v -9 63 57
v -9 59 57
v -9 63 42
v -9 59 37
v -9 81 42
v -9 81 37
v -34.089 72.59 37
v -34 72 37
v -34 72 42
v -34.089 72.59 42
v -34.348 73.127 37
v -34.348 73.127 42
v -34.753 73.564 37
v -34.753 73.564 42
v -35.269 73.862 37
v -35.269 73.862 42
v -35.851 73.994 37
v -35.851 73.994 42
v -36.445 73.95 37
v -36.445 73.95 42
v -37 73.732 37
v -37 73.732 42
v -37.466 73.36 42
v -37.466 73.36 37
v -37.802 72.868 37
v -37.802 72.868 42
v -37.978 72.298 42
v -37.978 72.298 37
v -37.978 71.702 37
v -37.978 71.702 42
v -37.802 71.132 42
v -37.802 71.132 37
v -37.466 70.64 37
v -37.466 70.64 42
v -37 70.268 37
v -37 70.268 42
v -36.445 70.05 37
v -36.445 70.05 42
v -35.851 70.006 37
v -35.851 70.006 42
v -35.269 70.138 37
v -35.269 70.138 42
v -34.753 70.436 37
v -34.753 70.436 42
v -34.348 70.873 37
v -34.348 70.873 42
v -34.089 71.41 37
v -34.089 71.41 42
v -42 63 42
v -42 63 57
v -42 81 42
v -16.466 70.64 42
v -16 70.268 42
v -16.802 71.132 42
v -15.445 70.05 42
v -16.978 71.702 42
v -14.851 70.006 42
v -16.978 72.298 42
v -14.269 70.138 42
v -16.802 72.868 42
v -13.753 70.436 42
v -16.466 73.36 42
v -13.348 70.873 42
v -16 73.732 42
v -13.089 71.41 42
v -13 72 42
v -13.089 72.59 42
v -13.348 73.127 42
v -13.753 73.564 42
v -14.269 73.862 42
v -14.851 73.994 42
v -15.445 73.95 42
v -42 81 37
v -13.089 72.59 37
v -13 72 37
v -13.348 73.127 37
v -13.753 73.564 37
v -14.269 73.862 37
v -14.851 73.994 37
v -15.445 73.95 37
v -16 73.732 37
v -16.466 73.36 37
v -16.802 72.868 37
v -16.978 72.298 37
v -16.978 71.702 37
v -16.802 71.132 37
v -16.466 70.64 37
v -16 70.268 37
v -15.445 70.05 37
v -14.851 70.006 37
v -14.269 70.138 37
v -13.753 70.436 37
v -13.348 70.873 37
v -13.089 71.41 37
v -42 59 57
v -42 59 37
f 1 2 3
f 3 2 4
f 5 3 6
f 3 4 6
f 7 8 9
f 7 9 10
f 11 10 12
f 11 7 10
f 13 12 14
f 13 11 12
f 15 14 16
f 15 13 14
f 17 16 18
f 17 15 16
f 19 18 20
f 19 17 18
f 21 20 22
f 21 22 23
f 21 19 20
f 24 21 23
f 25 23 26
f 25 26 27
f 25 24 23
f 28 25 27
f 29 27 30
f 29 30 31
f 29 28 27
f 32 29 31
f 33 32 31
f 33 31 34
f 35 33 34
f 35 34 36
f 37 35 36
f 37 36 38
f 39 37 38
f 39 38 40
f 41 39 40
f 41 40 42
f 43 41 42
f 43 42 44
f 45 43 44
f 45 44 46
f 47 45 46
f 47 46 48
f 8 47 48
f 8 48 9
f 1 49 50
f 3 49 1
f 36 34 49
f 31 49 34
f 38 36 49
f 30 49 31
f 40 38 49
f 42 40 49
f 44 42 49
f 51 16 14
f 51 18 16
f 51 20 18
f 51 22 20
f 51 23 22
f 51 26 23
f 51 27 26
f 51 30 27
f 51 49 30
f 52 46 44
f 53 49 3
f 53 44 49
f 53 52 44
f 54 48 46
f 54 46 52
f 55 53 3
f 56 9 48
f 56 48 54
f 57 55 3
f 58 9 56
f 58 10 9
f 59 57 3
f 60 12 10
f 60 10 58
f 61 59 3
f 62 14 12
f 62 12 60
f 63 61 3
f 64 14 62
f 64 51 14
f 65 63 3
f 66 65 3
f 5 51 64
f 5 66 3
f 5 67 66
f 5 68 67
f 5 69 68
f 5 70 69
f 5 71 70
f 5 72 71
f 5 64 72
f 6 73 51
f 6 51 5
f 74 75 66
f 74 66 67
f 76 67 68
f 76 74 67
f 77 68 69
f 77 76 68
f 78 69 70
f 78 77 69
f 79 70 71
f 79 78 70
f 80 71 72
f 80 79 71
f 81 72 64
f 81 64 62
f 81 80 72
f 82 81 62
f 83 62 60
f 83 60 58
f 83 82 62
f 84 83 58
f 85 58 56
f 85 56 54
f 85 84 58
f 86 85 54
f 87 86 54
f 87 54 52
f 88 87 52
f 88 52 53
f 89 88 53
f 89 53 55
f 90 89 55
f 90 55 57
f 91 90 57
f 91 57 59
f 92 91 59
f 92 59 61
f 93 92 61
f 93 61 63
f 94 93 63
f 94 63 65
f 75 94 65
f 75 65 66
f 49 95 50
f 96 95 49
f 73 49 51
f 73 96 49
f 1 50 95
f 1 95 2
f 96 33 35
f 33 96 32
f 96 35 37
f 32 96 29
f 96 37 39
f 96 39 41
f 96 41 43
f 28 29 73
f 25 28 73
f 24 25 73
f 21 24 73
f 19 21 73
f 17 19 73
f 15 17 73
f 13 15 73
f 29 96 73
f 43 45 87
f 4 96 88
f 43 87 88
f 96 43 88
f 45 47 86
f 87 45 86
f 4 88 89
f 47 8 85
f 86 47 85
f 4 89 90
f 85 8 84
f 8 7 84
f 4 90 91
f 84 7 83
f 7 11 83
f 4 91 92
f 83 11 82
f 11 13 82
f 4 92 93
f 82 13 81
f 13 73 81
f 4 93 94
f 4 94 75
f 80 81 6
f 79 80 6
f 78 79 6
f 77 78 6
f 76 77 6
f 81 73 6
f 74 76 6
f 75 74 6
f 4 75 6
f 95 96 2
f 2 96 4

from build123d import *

# Parameters (mm, degrees)
CYLINDER291_R     = 2
CYLINDER291_DEPTH = 10
CYLINDER290_R     = 2
CYLINDER290_DEPTH = 10
BOX400_W          = 33
BOX400_H          = 22
BOX400_DEPTH      = 5
BOX397_W          = 33
BOX397_H          = 4
BOX397_DEPTH      = 20


with BuildPart() as cylinder291:
    # Cylinder291 → Cylinder291 (new body)
    with BuildSketch(Plane(origin=(-15, 72, 32), x_dir=(1, 0, 0), z_dir=(0, 0, 1))):
        Circle(CYLINDER291_R)
    extrude(amount=CYLINDER291_DEPTH)


with BuildPart() as fusion229:
    # Cylinder290 → Cylinder290 (new body)
    with BuildSketch(Plane(origin=(-36, 72, 32), x_dir=(1, 0, 0), z_dir=(0, 0, 1))):
        Circle(CYLINDER290_R)
    extrude(amount=CYLINDER290_DEPTH)

    # Fusion229: union Cylinder291
    add(cylinder291.part)


with BuildPart() as cut277:
    # Box400 → Box400 (new body)
    with BuildSketch(Plane(origin=(-42, 59, 37), x_dir=(1, 0, 0), z_dir=(0, 0, 1))):
        with Locations((16.5, 11)):
            Rectangle(BOX400_W, BOX400_H)
    extrude(amount=BOX400_DEPTH)

    # Cut277: cut Fusion229
    add(fusion229.part, mode=Mode.SUBTRACT)


with BuildPart() as lipo_cover:
    # Box397 → Box397 (new body)
    with BuildSketch(Plane(origin=(-42, 59, 37), x_dir=(1, 0, 0), z_dir=(0, 0, 1))):
        with Locations((16.5, 2)):
            Rectangle(BOX397_W, BOX397_H)
    extrude(amount=BOX397_DEPTH)

    # Fusion231: union Cut277
    add(cut277.part)


solid = lipo_cover.part
